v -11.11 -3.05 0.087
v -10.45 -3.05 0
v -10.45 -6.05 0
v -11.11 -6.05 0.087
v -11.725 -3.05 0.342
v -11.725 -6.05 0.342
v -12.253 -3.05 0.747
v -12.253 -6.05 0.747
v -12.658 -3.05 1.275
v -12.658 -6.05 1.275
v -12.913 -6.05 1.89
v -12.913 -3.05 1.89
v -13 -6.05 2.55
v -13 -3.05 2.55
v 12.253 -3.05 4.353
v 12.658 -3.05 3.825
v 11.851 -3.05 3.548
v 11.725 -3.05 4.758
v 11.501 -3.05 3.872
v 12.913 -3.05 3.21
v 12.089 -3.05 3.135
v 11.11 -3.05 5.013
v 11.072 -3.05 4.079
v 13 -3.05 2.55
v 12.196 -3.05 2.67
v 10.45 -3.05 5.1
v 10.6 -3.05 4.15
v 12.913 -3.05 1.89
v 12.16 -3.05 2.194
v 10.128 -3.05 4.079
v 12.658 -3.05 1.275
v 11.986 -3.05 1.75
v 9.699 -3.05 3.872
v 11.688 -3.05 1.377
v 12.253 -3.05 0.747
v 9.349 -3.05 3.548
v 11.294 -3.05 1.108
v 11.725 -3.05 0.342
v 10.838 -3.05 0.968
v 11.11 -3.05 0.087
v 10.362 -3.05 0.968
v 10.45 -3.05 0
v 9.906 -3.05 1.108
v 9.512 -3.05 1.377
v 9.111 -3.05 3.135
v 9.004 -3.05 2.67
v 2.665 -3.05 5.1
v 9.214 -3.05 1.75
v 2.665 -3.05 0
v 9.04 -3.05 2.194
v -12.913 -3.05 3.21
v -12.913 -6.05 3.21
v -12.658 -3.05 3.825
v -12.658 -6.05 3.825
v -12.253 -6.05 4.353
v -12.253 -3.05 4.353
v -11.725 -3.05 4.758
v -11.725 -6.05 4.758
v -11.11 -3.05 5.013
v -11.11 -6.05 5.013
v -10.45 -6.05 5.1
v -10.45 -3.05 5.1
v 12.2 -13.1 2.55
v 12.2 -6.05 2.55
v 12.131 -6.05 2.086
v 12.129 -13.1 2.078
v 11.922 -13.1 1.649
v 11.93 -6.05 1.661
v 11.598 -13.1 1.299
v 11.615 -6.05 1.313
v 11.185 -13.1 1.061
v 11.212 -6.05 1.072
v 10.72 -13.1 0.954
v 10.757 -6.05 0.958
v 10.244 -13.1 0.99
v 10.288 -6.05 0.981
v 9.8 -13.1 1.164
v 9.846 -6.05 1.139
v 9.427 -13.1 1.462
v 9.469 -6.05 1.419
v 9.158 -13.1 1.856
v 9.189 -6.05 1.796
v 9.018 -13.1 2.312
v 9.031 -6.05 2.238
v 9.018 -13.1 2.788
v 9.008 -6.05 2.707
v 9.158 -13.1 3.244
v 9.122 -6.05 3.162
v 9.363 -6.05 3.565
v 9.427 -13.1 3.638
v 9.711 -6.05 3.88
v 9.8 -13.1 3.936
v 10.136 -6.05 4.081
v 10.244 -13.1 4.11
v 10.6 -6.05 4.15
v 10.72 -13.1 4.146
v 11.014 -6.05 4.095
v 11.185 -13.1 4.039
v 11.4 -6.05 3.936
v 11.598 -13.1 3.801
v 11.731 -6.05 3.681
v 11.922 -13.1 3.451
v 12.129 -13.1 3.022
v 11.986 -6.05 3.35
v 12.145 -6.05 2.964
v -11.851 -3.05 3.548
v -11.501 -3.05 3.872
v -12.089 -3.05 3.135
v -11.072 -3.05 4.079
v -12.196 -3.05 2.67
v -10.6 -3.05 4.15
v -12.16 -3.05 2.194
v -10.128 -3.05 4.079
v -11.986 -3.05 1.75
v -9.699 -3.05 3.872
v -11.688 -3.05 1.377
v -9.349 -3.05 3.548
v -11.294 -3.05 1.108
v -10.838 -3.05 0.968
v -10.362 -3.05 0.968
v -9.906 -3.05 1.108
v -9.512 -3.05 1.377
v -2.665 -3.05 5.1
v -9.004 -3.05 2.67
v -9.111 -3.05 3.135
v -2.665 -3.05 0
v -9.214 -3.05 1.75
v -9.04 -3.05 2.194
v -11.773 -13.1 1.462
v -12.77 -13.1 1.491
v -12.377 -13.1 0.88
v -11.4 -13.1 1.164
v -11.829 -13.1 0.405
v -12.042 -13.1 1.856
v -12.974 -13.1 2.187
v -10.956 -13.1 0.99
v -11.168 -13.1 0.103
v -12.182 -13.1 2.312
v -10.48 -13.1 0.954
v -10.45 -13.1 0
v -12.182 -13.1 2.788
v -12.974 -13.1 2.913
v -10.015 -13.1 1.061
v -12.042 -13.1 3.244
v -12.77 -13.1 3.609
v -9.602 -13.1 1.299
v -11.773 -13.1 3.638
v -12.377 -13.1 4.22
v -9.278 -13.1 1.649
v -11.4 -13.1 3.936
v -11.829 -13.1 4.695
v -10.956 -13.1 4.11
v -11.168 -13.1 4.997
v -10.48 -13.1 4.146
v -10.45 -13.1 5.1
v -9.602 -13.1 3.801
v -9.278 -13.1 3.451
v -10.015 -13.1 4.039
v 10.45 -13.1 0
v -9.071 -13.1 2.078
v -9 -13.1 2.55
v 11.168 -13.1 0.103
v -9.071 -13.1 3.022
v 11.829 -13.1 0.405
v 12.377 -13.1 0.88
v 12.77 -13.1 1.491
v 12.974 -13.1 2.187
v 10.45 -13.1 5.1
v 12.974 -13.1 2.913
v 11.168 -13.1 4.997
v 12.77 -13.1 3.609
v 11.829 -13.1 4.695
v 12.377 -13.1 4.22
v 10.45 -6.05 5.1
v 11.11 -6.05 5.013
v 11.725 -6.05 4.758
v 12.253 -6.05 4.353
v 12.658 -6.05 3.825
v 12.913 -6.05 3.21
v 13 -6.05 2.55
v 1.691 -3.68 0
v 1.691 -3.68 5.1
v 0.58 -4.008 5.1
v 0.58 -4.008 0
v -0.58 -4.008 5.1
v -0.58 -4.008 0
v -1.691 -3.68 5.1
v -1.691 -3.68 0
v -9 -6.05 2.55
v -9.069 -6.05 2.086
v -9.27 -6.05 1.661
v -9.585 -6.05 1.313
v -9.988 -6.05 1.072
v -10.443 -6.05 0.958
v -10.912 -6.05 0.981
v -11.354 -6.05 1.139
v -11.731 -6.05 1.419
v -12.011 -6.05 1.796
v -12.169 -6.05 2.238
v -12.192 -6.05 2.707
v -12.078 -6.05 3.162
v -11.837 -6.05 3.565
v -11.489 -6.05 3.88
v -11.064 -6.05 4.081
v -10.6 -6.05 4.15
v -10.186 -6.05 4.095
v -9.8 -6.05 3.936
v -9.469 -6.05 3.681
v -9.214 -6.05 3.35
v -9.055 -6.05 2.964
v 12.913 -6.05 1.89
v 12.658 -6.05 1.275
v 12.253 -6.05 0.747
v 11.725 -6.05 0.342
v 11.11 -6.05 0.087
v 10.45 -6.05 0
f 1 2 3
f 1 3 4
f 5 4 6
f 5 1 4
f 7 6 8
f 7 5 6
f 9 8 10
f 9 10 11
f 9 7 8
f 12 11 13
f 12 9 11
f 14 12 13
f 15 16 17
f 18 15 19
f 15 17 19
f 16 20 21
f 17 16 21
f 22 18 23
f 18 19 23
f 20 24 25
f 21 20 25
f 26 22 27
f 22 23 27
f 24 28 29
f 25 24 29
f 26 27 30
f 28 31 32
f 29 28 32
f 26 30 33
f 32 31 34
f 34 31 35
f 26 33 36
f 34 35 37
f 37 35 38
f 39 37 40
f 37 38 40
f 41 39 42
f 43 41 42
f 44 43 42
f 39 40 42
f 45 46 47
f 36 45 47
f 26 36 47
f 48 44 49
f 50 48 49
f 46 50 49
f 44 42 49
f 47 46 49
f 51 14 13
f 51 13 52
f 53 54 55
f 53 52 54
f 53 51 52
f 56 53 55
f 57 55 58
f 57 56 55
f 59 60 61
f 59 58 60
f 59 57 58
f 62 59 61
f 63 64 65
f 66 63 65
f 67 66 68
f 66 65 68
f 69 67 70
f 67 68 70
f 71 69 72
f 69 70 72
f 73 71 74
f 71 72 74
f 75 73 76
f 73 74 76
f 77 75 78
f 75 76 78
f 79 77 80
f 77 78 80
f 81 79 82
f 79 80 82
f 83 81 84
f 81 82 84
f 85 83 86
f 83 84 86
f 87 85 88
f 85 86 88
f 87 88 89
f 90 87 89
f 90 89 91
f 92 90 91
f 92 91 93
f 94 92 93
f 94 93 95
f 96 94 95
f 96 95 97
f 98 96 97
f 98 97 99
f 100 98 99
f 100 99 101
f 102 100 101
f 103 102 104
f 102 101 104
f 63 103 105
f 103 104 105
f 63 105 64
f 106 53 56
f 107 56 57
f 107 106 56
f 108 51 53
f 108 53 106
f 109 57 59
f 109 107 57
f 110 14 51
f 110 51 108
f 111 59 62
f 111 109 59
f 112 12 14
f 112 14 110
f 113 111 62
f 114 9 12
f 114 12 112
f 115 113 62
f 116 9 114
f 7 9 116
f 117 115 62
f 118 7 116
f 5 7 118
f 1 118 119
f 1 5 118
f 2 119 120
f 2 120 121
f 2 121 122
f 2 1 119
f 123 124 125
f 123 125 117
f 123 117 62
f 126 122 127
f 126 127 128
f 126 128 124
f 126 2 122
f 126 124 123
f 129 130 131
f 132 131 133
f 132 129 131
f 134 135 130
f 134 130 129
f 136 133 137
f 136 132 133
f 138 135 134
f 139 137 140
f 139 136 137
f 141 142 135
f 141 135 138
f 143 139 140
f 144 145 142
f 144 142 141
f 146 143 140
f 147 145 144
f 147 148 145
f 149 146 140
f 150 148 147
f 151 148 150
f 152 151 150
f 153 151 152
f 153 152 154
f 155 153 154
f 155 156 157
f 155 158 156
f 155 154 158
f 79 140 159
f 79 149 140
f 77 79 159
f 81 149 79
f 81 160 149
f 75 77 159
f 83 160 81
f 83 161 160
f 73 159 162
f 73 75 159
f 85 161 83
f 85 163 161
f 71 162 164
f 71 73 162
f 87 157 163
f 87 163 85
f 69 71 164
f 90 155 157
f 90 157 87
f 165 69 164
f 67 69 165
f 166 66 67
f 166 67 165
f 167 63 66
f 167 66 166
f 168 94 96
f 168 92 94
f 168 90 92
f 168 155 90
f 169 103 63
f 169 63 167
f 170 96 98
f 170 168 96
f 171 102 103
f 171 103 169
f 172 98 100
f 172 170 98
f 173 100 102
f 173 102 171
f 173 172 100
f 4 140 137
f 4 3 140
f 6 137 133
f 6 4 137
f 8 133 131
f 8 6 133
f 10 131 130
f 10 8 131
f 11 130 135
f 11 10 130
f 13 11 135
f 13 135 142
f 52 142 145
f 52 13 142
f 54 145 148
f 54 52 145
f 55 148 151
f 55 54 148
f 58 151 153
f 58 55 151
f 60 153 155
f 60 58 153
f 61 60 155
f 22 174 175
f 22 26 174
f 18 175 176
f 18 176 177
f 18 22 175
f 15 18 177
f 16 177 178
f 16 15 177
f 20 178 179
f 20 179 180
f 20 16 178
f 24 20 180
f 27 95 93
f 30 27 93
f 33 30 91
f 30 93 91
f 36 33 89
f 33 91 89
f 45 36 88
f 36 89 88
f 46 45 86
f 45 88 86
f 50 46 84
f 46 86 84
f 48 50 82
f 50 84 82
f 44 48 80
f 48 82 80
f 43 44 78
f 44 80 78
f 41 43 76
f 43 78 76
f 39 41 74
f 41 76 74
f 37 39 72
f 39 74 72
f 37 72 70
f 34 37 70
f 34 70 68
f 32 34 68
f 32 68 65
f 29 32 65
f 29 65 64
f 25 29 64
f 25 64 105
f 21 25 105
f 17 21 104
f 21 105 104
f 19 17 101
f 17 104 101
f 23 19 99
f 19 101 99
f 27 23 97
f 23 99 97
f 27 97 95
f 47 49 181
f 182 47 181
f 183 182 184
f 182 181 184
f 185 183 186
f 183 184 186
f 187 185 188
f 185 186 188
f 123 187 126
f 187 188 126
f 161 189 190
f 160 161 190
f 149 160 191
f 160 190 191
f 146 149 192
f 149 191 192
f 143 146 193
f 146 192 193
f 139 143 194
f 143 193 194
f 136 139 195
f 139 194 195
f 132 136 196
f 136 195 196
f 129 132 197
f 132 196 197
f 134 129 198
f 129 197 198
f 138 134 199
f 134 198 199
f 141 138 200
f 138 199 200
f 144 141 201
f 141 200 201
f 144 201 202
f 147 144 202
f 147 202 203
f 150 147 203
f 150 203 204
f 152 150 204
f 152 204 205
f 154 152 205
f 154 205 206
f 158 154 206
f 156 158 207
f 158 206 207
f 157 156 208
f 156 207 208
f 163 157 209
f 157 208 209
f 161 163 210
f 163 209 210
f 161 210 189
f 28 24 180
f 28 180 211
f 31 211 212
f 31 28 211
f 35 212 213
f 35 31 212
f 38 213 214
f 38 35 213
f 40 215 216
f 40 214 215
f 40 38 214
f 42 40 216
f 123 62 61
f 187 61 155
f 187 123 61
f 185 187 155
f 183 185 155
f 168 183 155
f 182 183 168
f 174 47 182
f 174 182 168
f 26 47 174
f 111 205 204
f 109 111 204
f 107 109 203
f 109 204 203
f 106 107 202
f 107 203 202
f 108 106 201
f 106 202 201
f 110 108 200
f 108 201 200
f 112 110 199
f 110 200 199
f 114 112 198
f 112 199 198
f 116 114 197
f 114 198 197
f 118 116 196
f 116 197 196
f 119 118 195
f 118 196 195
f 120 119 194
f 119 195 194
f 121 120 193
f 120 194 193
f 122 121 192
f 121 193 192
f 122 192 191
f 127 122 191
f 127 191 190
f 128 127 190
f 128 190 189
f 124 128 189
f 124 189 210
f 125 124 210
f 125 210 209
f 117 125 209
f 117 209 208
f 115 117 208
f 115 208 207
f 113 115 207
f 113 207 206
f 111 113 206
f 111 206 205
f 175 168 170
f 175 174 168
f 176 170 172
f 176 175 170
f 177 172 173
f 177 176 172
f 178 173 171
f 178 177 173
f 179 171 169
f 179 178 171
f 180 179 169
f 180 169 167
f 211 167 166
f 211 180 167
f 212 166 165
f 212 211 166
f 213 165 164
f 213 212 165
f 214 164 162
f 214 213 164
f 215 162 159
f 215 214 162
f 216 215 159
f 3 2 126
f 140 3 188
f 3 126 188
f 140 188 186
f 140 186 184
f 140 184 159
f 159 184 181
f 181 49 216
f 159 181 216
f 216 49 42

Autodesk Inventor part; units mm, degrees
ref_plane "YZ Plane" through (0, 0, 0) normal (1, 0, 0) x (0, 1, 0)
ref_plane "XZ Plane" through (0, 0, 0) normal (0, 1, 0) x (-1, 0, 0)
sketch "Эскиз1" plane through (0, 0, 0) normal (0, 0, 1) x (1, 0, 0)
  circle A0 centre (0, 0) radius 4.05
  line L0 (-6.05, -6.05) -> (6.05, -6.05)
  line L1 (6.05, -6.05) -> (6.05, 6.05)
  line L2 (6.05, 6.05) -> (-6.05, 6.05)
  line L3 (-6.05, 6.05) -> (-6.05, -6.05)
  line L4 (-6.05, -6.05) -> (6.05, 6.05) construction
  line L5 (6.05, -6.05) -> (-6.05, 6.05) construction
  line L6 (0, 6.05) -> (0, 4.05)
  line L7 (-6.05, 0) -> (-4.05, 0)
  line L8 (-13, -3.05) -> (0, -3.05)
  line L9 (0, -3.05) -> (0, -6.05)
  line L10 (0, -6.05) -> (-13, -6.05)
  line L11 (-13, -6.05) -> (-13, -3.05)
  line L12 (13, -3.05) -> (0, -3.05)
  line L13 (0, -6.05) -> (13, -6.05)
  line L14 (13, -6.05) -> (13, -3.05)
  point P0 (0, -4.55)
  point P1 (0, -6.05)
  point P2 (2.6646, -3.05)
  point P3 (-2.6646, -3.05)
  dimension "d0" = 8.1
  dimension "d1" = 2
  dimension "d2" = 2
  dimension "d3" = 3
  dimension "d5" = 3
  dimension "d6" = 6.95
extrude "Выдавливание1" add sketch "Эскиз1" along normal blind 5.1 contours L12 L1 L0 L9 A0 | L9 L0 L3 L8 A0 | L12 L14 L13 L1 | L3 L10 L11 L8
sketch "Эскиз2" plane through (-13, -3.05, 0) normal (0, 1, 0) x (1, 0, 0)
  line L0 (0, 0) -> (0, -5.1) projected
  line L1 (0, -2.55) -> (2.4, -2.55)
  point P0 (13, 0)
  dimension "d9" = 2.4
ref_plane "РабПлоскость1" through (0, -6.05, 0) normal (1, 0, 0) x (0, 0, -1)
hole "Отверстие1" at (-10.6, -3.05, 2.55) direction (0, -1, 0) diameter 3.2 end through all
mirror "Зеркальное отражение1" about plane through (0, -6.05, 0) normal (1, 0, 0) of "Отверстие1"
fillet "Сопряжение1" radius 2.55 4 edges at (-13, -4.55, 5.1) (-13, -4.55, 0) (13, -4.55, 5.1) (13, -4.55, 0)
sketch "Эскиз3" plane through (-10.45, -6.05, 0) normal (0, -1, 0) x (1, 0, 0)
  arc A0 (20.9, 0) -> (20.9, 5.1) centre (20.9, 2.55) ccw projected
  line L0 (0, 5.1) -> (20.9, 5.1) projected
  arc A1 (0, 5.1) -> (0, 0) centre (0, 2.55) ccw projected
  line L1 (0, 0) -> (20.9, 0) projected
  circle A2 centre (-0.15, 2.55) radius 1.6 projected
  circle A3 centre (21.05, 2.55) radius 1.6 projected
  point P0 (10.45, 0)
extrude "Выдавливание2" add sketch "Эскиз3" along normal blind 7.05
properties part number "Стойка подшипника 3мм"
